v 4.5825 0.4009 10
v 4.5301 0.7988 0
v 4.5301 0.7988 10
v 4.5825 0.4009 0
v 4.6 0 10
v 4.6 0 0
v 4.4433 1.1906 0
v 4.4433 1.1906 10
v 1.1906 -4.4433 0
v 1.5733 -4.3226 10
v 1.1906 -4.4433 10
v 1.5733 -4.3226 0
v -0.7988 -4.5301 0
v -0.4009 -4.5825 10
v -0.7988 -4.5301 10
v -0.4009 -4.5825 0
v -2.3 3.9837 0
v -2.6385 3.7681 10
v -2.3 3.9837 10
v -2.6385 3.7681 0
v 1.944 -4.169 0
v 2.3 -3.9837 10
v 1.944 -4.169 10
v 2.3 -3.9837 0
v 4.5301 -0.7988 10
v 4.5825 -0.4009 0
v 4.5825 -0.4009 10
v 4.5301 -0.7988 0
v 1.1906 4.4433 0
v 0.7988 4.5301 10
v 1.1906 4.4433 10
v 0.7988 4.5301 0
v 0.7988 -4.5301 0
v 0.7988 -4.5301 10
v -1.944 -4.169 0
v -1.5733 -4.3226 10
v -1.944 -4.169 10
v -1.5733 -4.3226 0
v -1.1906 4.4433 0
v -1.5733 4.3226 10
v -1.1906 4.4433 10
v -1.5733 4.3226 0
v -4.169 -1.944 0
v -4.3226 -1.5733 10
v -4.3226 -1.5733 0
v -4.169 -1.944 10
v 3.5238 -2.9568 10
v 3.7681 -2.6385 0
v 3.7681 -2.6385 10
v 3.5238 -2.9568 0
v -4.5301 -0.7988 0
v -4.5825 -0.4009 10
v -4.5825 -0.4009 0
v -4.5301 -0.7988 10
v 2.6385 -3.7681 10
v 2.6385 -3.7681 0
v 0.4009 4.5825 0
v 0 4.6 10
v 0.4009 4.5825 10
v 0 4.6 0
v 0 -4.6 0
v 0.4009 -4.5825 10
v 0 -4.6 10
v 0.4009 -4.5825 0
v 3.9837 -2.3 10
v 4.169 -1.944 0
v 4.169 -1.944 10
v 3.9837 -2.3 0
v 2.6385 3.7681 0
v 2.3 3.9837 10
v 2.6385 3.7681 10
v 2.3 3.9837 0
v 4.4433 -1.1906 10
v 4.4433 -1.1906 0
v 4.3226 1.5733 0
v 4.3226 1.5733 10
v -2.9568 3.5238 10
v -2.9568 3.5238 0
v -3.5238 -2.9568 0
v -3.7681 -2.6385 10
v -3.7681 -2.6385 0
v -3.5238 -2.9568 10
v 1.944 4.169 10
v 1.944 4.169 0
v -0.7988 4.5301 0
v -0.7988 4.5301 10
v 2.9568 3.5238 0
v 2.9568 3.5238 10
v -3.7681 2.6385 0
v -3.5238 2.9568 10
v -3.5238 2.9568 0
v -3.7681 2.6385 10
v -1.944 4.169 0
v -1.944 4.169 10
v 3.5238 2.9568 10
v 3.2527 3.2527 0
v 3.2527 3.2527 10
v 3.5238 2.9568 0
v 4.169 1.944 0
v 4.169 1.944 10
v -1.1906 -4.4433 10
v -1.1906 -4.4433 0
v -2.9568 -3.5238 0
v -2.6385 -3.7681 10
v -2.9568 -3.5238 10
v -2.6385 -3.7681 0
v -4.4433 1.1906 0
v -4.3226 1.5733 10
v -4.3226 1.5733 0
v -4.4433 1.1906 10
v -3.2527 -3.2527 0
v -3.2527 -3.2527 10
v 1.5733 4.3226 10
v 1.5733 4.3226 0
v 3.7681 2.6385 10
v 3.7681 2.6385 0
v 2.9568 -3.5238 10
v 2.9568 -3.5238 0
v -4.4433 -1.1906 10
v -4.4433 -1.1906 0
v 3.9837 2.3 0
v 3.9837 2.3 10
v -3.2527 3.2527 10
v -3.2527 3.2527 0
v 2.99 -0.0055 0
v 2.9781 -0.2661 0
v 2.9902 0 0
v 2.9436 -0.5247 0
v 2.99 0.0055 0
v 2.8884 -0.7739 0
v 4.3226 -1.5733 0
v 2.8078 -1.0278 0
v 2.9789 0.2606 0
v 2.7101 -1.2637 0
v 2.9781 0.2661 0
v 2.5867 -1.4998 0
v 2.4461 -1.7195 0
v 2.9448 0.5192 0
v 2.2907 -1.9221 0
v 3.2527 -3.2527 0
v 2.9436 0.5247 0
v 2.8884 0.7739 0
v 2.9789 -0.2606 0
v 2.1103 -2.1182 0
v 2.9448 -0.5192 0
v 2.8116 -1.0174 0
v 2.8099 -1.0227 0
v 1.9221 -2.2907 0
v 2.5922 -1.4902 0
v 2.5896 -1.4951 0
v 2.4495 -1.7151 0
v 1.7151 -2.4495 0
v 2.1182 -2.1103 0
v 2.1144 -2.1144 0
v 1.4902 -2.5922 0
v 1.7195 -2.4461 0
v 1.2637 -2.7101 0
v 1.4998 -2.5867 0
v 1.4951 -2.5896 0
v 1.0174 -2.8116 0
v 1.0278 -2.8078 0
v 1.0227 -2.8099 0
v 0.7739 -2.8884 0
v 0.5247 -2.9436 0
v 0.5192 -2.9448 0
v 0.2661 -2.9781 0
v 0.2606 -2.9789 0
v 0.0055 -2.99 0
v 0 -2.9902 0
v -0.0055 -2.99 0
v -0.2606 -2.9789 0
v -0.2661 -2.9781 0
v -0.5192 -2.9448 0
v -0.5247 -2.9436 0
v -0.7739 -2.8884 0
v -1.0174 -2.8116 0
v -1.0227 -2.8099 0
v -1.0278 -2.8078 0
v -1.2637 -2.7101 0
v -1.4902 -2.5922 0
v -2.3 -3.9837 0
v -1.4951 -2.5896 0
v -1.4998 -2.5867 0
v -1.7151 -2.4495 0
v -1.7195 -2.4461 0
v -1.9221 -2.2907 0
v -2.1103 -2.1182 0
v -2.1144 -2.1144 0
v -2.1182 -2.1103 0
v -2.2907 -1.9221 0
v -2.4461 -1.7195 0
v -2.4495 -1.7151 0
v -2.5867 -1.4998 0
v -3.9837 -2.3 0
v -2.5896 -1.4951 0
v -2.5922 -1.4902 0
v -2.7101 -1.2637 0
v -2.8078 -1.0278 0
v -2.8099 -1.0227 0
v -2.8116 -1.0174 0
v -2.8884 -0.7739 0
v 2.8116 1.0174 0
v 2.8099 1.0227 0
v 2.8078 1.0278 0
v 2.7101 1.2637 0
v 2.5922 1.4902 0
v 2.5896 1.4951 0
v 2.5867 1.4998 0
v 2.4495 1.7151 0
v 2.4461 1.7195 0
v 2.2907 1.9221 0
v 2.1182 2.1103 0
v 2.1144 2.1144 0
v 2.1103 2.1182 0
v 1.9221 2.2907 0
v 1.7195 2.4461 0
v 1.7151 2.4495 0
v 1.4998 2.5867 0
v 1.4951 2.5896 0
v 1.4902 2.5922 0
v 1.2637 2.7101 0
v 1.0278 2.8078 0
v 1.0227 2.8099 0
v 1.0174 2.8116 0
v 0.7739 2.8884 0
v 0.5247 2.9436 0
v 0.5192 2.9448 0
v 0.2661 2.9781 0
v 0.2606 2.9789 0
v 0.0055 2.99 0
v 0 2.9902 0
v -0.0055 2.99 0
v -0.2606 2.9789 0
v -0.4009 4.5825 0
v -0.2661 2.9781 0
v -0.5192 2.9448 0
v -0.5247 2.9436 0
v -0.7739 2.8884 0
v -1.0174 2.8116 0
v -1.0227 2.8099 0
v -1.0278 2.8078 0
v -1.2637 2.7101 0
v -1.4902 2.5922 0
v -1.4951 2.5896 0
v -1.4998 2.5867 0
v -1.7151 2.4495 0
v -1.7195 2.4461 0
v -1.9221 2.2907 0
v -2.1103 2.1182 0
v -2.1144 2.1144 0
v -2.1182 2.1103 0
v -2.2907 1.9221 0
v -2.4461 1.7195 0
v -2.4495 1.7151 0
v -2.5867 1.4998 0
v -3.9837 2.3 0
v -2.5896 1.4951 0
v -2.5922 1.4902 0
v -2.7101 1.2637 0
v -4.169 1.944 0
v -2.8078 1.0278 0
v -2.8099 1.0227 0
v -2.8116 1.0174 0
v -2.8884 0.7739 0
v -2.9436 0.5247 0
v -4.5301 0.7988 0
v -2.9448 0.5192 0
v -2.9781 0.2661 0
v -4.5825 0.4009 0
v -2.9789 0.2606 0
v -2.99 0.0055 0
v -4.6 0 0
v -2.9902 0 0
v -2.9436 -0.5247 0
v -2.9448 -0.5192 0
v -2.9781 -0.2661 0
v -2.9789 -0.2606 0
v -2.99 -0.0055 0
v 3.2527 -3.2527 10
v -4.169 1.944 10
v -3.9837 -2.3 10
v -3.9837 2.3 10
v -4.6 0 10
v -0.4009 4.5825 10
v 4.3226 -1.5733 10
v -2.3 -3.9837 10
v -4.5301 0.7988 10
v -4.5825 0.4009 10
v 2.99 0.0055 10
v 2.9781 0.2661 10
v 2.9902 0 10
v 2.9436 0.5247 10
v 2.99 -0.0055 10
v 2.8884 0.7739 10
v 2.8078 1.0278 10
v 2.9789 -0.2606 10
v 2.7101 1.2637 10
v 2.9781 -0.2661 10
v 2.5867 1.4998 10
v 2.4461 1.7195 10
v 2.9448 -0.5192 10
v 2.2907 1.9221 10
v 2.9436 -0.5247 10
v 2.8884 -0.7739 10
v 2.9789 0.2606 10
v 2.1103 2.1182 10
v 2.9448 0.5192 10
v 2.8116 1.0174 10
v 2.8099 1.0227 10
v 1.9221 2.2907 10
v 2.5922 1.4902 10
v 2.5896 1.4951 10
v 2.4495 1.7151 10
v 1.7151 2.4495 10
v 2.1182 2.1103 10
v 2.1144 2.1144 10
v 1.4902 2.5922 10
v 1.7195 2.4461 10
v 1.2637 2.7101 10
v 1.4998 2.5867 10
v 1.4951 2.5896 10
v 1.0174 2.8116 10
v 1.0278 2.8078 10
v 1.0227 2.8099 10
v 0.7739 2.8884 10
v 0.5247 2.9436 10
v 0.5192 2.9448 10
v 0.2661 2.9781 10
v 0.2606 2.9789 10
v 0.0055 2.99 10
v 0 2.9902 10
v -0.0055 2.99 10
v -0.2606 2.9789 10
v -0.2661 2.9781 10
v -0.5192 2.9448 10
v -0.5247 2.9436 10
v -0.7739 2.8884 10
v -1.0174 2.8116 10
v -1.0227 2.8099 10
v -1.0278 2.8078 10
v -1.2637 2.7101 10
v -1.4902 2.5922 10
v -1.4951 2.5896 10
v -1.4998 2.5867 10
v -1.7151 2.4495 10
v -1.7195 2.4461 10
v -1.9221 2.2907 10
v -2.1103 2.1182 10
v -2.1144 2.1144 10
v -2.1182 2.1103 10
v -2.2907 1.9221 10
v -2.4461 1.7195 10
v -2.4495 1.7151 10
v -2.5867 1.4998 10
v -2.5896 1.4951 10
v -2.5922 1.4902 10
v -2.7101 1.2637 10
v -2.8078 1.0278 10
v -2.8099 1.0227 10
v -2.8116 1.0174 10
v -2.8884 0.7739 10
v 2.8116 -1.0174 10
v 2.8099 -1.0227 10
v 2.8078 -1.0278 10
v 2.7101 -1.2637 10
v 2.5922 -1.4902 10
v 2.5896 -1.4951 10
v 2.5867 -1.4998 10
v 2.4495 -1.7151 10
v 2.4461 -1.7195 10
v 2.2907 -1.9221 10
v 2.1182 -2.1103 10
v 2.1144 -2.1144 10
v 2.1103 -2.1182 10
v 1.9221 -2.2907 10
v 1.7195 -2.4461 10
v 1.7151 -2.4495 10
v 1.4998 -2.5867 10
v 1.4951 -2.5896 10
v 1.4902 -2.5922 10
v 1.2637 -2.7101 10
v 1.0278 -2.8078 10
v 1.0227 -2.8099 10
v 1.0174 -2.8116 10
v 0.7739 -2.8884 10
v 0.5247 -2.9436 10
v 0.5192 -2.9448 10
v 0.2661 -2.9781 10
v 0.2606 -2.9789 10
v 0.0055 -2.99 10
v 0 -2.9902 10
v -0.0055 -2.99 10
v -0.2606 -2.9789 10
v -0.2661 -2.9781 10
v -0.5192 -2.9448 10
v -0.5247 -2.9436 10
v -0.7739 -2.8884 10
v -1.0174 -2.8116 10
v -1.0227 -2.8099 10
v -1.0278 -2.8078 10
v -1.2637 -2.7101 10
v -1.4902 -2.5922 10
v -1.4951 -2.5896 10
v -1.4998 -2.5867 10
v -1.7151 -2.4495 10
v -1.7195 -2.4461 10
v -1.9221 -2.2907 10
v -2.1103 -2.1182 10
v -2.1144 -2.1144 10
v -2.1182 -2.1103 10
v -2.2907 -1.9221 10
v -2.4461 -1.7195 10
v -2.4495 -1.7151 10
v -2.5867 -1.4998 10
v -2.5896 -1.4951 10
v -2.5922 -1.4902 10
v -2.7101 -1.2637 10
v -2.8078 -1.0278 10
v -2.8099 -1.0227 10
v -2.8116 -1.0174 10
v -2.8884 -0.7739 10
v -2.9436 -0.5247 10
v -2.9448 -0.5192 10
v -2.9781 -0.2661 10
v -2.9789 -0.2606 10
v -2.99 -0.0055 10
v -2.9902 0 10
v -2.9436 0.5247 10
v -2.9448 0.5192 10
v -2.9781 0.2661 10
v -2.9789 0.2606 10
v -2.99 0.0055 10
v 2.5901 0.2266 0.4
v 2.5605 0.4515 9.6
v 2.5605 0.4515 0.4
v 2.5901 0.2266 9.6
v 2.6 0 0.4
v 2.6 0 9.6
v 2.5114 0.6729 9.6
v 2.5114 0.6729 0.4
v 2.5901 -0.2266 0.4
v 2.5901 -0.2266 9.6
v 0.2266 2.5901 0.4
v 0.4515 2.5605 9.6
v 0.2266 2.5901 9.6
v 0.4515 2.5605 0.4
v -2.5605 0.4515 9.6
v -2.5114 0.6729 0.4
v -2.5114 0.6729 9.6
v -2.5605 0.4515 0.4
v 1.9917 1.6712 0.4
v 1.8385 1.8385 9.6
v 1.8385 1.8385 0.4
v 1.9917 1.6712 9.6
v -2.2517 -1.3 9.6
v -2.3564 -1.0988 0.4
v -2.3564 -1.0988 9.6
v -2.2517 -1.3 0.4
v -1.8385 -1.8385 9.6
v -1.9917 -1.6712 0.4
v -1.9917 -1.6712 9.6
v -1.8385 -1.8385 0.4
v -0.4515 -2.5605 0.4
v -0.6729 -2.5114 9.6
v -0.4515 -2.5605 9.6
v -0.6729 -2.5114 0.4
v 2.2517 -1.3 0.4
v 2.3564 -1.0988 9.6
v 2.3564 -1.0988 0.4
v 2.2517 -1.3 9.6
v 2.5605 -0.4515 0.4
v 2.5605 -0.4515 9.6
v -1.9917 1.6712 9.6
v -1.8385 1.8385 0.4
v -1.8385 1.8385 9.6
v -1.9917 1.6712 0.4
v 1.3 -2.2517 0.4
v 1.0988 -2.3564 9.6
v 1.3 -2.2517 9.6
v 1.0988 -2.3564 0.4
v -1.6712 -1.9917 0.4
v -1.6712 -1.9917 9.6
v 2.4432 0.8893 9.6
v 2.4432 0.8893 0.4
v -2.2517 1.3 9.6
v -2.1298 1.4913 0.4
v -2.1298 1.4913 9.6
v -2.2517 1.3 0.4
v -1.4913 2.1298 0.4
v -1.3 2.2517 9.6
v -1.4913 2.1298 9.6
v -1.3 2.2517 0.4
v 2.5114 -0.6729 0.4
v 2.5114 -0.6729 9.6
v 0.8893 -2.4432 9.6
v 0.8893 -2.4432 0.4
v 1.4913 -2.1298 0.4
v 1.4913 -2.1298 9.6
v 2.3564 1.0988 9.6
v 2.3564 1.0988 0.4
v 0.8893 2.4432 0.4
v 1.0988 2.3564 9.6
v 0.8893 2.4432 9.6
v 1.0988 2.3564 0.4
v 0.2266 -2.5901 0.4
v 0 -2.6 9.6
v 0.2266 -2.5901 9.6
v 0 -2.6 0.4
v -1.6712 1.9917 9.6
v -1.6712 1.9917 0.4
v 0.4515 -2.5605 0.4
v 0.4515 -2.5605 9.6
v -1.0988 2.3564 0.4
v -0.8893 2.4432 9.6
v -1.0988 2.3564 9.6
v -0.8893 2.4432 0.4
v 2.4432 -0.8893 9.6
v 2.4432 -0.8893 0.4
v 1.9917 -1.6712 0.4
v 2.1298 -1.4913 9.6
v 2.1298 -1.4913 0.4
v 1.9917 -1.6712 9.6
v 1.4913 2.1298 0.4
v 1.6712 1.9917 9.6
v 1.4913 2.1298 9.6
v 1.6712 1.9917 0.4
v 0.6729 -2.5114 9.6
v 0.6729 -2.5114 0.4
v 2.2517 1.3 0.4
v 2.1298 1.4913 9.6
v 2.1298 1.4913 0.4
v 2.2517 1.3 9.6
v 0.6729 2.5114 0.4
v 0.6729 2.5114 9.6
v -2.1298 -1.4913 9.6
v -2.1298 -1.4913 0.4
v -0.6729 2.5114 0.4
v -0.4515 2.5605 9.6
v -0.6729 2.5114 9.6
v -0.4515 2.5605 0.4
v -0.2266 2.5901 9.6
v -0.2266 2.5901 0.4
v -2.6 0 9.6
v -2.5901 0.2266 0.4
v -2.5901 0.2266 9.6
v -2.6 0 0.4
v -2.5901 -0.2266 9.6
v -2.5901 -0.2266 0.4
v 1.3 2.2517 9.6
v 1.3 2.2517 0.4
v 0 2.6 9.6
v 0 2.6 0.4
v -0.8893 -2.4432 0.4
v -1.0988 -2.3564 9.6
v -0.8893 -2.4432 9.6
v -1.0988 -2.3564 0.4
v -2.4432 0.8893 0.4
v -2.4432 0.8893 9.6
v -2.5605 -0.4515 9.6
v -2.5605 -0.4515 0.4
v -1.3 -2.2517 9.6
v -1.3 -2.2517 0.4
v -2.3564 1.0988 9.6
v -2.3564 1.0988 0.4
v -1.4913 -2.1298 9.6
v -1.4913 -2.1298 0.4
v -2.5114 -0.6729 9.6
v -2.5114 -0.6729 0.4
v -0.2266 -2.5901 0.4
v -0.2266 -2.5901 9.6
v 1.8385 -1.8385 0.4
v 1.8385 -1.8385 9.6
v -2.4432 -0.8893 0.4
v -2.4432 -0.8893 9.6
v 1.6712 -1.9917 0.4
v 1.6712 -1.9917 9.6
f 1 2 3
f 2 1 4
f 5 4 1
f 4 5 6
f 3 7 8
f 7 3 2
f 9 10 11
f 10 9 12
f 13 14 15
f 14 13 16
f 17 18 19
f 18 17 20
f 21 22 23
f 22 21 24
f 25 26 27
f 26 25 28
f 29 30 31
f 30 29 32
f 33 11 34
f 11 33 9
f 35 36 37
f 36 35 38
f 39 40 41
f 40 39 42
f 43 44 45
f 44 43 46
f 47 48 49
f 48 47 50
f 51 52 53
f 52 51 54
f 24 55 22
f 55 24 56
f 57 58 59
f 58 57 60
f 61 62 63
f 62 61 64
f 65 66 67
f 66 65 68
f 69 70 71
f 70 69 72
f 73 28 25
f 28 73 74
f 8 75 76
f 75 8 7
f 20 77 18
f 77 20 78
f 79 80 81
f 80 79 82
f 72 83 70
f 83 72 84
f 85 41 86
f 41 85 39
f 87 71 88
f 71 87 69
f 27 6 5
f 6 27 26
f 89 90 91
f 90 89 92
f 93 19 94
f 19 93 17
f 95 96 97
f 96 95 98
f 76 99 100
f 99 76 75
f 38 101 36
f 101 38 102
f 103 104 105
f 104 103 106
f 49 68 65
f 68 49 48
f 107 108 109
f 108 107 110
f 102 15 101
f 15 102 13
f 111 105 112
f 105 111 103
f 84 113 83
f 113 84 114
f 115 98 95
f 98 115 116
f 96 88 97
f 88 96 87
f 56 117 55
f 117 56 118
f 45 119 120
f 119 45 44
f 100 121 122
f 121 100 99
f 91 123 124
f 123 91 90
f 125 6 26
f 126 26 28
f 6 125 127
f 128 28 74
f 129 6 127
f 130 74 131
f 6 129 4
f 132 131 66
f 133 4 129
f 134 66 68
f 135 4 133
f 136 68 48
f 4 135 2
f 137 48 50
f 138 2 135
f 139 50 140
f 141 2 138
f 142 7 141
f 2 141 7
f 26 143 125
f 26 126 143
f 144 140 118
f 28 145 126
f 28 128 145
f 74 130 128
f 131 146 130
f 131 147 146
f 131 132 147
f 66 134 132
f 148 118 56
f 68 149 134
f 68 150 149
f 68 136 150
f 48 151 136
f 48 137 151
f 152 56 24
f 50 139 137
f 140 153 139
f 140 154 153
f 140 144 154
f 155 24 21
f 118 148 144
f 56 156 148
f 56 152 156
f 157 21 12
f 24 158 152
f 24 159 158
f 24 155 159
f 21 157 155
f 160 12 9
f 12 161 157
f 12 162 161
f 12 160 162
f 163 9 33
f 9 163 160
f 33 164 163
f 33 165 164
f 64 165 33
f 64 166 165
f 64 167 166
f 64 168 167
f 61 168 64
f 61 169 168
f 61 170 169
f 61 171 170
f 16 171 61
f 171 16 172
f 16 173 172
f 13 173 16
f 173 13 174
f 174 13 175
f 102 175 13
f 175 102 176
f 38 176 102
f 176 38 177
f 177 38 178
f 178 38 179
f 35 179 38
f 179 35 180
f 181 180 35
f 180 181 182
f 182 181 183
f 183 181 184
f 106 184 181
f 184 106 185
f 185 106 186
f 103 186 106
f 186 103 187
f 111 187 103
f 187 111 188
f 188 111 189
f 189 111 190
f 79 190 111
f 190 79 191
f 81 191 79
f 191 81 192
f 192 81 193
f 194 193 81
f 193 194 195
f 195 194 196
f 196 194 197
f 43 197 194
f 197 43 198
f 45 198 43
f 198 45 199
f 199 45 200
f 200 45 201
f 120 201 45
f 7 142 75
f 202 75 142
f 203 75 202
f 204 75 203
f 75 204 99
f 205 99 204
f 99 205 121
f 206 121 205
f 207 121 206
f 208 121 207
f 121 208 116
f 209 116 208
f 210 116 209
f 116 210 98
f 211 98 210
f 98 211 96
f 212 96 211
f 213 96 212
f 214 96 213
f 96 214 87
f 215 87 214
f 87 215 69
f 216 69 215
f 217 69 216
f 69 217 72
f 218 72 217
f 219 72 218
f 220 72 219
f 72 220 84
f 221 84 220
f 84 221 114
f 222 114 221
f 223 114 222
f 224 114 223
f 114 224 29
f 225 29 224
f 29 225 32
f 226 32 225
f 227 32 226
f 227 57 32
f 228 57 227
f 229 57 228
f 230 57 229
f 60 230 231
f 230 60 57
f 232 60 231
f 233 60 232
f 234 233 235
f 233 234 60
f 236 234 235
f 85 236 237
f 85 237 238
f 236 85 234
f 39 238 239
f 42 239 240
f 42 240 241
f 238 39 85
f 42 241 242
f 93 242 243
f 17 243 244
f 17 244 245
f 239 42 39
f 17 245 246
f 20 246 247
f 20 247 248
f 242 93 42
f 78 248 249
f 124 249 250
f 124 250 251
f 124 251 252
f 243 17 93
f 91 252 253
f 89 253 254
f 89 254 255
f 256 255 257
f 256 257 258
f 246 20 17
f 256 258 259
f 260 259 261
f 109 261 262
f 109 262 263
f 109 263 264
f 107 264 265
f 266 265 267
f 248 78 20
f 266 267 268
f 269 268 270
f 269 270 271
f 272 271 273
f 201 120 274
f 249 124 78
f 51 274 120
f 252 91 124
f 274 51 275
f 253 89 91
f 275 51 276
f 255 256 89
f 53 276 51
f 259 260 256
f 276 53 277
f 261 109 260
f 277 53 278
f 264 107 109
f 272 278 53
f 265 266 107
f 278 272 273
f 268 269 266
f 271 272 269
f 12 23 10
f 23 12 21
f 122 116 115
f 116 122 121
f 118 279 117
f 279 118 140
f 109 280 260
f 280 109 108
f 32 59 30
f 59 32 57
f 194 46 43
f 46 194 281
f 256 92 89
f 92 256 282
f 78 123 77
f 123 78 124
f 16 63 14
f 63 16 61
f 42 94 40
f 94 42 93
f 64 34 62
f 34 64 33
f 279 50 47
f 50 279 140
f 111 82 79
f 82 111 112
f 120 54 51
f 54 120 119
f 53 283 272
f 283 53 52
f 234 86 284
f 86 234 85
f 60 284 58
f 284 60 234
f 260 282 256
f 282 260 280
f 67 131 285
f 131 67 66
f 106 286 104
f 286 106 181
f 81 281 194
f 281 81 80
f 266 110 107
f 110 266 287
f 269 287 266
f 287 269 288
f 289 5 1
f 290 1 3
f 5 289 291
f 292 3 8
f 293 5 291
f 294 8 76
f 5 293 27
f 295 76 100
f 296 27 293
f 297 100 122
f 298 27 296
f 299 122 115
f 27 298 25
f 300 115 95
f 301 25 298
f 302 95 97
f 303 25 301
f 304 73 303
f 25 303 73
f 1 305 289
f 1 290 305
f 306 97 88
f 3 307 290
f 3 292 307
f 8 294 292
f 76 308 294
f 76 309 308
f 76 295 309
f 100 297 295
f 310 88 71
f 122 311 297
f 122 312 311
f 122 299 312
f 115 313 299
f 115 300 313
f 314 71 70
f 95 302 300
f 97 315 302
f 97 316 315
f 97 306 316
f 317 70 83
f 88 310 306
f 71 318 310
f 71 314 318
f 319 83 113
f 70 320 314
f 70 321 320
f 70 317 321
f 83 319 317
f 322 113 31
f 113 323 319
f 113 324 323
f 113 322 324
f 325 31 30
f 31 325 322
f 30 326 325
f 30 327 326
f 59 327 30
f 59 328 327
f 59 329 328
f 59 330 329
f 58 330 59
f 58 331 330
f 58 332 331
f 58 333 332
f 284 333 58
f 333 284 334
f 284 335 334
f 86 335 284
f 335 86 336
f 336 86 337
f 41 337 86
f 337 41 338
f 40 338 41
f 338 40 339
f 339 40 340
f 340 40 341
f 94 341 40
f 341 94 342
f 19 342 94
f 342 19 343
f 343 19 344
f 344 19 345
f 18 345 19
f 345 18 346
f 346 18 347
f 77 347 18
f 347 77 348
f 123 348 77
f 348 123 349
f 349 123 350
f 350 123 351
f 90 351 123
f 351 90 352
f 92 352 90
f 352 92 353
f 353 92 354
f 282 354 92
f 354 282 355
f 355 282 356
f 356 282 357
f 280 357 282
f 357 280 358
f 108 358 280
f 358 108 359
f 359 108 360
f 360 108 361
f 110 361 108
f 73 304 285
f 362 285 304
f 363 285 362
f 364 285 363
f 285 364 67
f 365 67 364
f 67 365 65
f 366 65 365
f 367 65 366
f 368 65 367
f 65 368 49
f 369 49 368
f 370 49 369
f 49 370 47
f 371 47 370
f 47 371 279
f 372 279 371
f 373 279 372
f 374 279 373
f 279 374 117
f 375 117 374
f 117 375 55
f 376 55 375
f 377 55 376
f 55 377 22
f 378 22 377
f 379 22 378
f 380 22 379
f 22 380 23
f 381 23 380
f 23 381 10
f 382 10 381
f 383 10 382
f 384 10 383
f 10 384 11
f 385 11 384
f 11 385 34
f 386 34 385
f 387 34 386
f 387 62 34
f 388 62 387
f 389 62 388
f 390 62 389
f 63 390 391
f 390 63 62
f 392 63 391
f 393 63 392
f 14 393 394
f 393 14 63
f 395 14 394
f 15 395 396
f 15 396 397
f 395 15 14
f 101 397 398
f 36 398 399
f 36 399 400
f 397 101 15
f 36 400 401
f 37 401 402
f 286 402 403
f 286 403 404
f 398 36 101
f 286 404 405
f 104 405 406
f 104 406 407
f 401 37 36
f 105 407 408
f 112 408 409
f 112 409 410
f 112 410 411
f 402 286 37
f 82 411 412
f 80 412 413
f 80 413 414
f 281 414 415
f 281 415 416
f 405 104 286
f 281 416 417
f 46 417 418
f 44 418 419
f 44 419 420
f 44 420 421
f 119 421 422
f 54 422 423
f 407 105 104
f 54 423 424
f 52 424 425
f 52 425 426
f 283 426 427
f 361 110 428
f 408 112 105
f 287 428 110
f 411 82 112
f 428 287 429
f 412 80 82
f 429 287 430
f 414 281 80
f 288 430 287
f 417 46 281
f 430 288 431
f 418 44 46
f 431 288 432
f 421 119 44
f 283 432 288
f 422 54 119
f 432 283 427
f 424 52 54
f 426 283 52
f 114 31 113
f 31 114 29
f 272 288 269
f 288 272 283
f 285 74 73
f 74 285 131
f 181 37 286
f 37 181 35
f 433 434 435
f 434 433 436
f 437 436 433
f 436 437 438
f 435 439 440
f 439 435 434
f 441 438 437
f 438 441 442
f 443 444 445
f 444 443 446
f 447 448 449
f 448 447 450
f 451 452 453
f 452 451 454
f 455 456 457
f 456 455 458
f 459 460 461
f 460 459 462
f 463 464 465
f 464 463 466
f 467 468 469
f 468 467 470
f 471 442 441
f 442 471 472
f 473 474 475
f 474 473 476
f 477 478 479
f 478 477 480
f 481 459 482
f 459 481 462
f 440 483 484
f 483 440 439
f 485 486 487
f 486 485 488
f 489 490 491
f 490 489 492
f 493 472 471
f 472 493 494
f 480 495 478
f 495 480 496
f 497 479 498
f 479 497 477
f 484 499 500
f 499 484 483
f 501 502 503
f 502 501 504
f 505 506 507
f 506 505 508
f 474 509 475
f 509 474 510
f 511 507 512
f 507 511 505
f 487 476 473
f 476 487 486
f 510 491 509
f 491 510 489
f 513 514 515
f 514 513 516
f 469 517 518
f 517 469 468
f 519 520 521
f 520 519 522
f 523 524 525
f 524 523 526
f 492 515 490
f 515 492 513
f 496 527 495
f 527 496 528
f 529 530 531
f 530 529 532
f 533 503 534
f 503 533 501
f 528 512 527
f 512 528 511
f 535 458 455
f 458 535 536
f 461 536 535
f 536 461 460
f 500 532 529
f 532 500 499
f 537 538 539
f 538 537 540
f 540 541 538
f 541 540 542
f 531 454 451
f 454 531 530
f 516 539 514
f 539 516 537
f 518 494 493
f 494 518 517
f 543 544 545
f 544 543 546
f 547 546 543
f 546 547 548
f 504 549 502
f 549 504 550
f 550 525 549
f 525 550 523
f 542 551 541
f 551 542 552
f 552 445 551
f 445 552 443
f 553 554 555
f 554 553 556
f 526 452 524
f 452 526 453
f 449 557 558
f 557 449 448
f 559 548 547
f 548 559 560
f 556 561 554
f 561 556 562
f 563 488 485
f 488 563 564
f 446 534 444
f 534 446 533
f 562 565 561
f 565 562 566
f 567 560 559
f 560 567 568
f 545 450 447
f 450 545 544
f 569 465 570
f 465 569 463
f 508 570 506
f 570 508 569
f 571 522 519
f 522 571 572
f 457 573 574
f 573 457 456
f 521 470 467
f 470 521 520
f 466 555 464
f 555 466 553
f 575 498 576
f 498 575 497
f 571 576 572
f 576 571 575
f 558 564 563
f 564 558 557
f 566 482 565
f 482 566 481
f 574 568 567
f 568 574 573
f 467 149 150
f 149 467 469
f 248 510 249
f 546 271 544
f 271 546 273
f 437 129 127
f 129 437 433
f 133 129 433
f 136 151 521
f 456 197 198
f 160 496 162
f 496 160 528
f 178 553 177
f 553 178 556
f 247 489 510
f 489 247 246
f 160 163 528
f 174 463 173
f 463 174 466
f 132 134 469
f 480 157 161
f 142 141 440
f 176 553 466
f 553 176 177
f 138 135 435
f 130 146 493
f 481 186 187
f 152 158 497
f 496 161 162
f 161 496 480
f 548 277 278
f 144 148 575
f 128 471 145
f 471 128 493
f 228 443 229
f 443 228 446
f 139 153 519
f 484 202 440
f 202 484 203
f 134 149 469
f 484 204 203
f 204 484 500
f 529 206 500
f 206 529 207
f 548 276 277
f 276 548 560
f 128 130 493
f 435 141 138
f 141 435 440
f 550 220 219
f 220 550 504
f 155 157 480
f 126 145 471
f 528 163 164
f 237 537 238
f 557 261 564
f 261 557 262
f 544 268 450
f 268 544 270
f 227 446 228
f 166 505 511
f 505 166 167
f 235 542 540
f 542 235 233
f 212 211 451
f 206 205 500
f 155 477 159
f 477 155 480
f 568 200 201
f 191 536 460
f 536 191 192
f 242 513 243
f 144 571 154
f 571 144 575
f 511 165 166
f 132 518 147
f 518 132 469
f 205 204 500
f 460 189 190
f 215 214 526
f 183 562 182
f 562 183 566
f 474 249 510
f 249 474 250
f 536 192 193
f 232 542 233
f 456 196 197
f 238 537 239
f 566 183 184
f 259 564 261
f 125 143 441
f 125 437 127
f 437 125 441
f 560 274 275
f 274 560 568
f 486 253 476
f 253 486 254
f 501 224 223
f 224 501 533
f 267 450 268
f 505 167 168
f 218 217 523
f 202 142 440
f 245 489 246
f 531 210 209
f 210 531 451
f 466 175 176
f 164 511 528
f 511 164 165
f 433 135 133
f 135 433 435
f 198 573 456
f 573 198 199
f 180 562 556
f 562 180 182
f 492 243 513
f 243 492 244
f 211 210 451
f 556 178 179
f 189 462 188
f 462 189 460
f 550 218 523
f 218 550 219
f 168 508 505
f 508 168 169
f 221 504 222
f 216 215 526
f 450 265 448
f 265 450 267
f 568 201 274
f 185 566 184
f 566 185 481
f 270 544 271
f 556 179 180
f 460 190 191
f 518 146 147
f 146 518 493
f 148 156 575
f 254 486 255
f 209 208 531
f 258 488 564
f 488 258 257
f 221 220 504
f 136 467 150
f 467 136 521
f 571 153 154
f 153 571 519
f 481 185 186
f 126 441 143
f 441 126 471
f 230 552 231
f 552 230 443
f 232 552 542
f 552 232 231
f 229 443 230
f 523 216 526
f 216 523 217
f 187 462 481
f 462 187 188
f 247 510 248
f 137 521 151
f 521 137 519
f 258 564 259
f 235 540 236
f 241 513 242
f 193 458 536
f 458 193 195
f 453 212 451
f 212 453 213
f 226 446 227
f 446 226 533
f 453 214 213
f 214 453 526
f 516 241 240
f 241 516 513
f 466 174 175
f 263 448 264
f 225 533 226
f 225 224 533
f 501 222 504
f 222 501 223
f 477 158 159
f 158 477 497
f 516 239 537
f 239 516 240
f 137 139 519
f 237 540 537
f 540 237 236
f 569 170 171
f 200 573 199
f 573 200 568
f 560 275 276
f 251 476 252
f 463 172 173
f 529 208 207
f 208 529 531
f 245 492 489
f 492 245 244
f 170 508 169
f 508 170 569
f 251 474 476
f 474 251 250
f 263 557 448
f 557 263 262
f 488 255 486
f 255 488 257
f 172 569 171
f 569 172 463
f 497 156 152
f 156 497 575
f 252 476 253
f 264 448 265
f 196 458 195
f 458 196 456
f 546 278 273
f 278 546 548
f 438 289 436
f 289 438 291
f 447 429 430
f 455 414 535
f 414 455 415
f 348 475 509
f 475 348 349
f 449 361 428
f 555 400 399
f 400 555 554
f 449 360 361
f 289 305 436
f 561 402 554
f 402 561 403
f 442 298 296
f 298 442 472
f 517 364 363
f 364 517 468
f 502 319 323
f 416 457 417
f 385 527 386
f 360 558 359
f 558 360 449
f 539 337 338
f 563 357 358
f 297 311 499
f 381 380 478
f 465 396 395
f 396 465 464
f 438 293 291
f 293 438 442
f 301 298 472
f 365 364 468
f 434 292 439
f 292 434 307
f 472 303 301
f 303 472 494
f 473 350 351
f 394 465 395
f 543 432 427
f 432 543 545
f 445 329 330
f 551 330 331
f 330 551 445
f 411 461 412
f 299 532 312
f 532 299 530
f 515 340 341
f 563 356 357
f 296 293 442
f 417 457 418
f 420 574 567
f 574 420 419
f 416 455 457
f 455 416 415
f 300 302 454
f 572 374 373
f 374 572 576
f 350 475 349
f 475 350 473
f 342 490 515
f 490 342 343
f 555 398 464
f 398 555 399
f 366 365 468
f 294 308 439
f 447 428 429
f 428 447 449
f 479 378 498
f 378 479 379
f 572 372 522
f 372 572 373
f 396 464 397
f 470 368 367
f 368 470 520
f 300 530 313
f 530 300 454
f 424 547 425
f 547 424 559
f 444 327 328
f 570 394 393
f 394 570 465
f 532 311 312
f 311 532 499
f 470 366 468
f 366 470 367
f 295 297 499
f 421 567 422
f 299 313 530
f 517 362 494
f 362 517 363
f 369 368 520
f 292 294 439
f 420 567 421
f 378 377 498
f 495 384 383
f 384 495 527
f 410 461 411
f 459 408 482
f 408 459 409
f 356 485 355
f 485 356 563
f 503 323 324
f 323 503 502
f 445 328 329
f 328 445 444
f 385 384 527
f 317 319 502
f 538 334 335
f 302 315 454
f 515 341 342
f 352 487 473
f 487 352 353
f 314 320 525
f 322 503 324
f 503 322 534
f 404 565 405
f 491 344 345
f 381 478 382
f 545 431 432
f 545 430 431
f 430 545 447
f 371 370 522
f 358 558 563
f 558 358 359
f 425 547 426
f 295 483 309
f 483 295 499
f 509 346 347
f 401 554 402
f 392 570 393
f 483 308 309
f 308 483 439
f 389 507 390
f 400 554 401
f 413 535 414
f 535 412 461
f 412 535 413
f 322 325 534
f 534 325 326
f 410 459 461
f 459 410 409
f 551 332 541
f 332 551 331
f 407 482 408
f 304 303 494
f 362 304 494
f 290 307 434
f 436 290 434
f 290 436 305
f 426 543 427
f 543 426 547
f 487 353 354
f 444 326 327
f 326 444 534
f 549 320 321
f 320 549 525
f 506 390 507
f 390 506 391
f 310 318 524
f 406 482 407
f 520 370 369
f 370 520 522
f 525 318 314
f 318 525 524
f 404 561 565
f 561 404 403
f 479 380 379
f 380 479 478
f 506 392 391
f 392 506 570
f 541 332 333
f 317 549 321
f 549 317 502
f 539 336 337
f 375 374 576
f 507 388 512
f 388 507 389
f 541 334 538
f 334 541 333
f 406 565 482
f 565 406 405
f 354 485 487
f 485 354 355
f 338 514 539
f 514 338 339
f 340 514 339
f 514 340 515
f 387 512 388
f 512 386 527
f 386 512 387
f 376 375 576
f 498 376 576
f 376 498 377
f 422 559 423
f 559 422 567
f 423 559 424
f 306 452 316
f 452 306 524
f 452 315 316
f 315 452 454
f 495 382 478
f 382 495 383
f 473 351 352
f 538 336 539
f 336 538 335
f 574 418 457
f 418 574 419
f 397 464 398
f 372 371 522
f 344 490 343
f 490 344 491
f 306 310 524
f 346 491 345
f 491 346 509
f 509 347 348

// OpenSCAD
/* ============================================
   SPACER / ENTRETOISE — Générateur paramétrique
   Compatible MakerWorld Customizer
   ============================================ */

/* [Dimensions] */

// Diamètre intérieur nominal (M3=3, M4=4, M5=5...)
inner_diameter = 5;

// Épaisseur de paroi (mm)
wall_thickness = 2;

// Hauteur / longueur (mm)
height = 10;

/* [Tolérance] */

// Matériau utilisé
material = 0; // [0:PLA (+0.2mm), 1:PETG (+0.3mm), 2:Manuel]

// Tolérance manuelle (uniquement si matériau = Manuel)
manual_tolerance = 0.2;

/* [Options] */

// Chanfrein entrée/sortie (0 = désactivé)
chamfer = 0.4;

// Qualité des cercles (segments)
$fn = 72;


/* ============================================
   LOGIQUE INTERNE
   ============================================ */

tol = (material == 0) ? 0.2 :
      (material == 1) ? 0.3 :
      manual_tolerance;

inner_r = (inner_diameter / 2) + (tol / 2);
outer_r = inner_r + wall_thickness;


/* ============================================
   MODULE PRINCIPAL
   ============================================ */

module spacer() {
    difference() {
        // Corps extérieur
        cylinder(h = height, r = outer_r, center = false);

        // Alésage intérieur (légèrement prolongé pour éviter artefacts booléens)
        translate([0, 0, -0.01])
            cylinder(h = height + 0.02, r = inner_r, center = false);

        // Chanfrein inférieur
        if (chamfer > 0) {
            translate([0, 0, -0.01])
                cylinder(
                    h = chamfer + 0.01,
                    r1 = inner_r + chamfer,
                    r2 = inner_r,
                    center = false
                );
        }

        // Chanfrein supérieur
        if (chamfer > 0) {
            translate([0, 0, height - chamfer])
                cylinder(
                    h = chamfer + 0.01,
                    r1 = inner_r,
                    r2 = inner_r + chamfer,
                    center = false
                );
        }
    }
}

spacer();


/* ============================================
   RÉSUMÉ DIMENSIONS (console OpenSCAD)
   ============================================ */

echo(str("=== SPACER RÉSUMÉ ==="));
echo(str("Ø intérieur nominal : ", inner_diameter, " mm"));
echo(str("Tolérance appliquée : +", tol, " mm"));
echo(str("Ø intérieur réel    : ", inner_diameter + tol, " mm"));
echo(str("Ø extérieur         : ", outer_r * 2, " mm"));
echo(str("Hauteur             : ", height, " mm"));
echo(str("Épaisseur paroi     : ", wall_thickness, " mm"));
